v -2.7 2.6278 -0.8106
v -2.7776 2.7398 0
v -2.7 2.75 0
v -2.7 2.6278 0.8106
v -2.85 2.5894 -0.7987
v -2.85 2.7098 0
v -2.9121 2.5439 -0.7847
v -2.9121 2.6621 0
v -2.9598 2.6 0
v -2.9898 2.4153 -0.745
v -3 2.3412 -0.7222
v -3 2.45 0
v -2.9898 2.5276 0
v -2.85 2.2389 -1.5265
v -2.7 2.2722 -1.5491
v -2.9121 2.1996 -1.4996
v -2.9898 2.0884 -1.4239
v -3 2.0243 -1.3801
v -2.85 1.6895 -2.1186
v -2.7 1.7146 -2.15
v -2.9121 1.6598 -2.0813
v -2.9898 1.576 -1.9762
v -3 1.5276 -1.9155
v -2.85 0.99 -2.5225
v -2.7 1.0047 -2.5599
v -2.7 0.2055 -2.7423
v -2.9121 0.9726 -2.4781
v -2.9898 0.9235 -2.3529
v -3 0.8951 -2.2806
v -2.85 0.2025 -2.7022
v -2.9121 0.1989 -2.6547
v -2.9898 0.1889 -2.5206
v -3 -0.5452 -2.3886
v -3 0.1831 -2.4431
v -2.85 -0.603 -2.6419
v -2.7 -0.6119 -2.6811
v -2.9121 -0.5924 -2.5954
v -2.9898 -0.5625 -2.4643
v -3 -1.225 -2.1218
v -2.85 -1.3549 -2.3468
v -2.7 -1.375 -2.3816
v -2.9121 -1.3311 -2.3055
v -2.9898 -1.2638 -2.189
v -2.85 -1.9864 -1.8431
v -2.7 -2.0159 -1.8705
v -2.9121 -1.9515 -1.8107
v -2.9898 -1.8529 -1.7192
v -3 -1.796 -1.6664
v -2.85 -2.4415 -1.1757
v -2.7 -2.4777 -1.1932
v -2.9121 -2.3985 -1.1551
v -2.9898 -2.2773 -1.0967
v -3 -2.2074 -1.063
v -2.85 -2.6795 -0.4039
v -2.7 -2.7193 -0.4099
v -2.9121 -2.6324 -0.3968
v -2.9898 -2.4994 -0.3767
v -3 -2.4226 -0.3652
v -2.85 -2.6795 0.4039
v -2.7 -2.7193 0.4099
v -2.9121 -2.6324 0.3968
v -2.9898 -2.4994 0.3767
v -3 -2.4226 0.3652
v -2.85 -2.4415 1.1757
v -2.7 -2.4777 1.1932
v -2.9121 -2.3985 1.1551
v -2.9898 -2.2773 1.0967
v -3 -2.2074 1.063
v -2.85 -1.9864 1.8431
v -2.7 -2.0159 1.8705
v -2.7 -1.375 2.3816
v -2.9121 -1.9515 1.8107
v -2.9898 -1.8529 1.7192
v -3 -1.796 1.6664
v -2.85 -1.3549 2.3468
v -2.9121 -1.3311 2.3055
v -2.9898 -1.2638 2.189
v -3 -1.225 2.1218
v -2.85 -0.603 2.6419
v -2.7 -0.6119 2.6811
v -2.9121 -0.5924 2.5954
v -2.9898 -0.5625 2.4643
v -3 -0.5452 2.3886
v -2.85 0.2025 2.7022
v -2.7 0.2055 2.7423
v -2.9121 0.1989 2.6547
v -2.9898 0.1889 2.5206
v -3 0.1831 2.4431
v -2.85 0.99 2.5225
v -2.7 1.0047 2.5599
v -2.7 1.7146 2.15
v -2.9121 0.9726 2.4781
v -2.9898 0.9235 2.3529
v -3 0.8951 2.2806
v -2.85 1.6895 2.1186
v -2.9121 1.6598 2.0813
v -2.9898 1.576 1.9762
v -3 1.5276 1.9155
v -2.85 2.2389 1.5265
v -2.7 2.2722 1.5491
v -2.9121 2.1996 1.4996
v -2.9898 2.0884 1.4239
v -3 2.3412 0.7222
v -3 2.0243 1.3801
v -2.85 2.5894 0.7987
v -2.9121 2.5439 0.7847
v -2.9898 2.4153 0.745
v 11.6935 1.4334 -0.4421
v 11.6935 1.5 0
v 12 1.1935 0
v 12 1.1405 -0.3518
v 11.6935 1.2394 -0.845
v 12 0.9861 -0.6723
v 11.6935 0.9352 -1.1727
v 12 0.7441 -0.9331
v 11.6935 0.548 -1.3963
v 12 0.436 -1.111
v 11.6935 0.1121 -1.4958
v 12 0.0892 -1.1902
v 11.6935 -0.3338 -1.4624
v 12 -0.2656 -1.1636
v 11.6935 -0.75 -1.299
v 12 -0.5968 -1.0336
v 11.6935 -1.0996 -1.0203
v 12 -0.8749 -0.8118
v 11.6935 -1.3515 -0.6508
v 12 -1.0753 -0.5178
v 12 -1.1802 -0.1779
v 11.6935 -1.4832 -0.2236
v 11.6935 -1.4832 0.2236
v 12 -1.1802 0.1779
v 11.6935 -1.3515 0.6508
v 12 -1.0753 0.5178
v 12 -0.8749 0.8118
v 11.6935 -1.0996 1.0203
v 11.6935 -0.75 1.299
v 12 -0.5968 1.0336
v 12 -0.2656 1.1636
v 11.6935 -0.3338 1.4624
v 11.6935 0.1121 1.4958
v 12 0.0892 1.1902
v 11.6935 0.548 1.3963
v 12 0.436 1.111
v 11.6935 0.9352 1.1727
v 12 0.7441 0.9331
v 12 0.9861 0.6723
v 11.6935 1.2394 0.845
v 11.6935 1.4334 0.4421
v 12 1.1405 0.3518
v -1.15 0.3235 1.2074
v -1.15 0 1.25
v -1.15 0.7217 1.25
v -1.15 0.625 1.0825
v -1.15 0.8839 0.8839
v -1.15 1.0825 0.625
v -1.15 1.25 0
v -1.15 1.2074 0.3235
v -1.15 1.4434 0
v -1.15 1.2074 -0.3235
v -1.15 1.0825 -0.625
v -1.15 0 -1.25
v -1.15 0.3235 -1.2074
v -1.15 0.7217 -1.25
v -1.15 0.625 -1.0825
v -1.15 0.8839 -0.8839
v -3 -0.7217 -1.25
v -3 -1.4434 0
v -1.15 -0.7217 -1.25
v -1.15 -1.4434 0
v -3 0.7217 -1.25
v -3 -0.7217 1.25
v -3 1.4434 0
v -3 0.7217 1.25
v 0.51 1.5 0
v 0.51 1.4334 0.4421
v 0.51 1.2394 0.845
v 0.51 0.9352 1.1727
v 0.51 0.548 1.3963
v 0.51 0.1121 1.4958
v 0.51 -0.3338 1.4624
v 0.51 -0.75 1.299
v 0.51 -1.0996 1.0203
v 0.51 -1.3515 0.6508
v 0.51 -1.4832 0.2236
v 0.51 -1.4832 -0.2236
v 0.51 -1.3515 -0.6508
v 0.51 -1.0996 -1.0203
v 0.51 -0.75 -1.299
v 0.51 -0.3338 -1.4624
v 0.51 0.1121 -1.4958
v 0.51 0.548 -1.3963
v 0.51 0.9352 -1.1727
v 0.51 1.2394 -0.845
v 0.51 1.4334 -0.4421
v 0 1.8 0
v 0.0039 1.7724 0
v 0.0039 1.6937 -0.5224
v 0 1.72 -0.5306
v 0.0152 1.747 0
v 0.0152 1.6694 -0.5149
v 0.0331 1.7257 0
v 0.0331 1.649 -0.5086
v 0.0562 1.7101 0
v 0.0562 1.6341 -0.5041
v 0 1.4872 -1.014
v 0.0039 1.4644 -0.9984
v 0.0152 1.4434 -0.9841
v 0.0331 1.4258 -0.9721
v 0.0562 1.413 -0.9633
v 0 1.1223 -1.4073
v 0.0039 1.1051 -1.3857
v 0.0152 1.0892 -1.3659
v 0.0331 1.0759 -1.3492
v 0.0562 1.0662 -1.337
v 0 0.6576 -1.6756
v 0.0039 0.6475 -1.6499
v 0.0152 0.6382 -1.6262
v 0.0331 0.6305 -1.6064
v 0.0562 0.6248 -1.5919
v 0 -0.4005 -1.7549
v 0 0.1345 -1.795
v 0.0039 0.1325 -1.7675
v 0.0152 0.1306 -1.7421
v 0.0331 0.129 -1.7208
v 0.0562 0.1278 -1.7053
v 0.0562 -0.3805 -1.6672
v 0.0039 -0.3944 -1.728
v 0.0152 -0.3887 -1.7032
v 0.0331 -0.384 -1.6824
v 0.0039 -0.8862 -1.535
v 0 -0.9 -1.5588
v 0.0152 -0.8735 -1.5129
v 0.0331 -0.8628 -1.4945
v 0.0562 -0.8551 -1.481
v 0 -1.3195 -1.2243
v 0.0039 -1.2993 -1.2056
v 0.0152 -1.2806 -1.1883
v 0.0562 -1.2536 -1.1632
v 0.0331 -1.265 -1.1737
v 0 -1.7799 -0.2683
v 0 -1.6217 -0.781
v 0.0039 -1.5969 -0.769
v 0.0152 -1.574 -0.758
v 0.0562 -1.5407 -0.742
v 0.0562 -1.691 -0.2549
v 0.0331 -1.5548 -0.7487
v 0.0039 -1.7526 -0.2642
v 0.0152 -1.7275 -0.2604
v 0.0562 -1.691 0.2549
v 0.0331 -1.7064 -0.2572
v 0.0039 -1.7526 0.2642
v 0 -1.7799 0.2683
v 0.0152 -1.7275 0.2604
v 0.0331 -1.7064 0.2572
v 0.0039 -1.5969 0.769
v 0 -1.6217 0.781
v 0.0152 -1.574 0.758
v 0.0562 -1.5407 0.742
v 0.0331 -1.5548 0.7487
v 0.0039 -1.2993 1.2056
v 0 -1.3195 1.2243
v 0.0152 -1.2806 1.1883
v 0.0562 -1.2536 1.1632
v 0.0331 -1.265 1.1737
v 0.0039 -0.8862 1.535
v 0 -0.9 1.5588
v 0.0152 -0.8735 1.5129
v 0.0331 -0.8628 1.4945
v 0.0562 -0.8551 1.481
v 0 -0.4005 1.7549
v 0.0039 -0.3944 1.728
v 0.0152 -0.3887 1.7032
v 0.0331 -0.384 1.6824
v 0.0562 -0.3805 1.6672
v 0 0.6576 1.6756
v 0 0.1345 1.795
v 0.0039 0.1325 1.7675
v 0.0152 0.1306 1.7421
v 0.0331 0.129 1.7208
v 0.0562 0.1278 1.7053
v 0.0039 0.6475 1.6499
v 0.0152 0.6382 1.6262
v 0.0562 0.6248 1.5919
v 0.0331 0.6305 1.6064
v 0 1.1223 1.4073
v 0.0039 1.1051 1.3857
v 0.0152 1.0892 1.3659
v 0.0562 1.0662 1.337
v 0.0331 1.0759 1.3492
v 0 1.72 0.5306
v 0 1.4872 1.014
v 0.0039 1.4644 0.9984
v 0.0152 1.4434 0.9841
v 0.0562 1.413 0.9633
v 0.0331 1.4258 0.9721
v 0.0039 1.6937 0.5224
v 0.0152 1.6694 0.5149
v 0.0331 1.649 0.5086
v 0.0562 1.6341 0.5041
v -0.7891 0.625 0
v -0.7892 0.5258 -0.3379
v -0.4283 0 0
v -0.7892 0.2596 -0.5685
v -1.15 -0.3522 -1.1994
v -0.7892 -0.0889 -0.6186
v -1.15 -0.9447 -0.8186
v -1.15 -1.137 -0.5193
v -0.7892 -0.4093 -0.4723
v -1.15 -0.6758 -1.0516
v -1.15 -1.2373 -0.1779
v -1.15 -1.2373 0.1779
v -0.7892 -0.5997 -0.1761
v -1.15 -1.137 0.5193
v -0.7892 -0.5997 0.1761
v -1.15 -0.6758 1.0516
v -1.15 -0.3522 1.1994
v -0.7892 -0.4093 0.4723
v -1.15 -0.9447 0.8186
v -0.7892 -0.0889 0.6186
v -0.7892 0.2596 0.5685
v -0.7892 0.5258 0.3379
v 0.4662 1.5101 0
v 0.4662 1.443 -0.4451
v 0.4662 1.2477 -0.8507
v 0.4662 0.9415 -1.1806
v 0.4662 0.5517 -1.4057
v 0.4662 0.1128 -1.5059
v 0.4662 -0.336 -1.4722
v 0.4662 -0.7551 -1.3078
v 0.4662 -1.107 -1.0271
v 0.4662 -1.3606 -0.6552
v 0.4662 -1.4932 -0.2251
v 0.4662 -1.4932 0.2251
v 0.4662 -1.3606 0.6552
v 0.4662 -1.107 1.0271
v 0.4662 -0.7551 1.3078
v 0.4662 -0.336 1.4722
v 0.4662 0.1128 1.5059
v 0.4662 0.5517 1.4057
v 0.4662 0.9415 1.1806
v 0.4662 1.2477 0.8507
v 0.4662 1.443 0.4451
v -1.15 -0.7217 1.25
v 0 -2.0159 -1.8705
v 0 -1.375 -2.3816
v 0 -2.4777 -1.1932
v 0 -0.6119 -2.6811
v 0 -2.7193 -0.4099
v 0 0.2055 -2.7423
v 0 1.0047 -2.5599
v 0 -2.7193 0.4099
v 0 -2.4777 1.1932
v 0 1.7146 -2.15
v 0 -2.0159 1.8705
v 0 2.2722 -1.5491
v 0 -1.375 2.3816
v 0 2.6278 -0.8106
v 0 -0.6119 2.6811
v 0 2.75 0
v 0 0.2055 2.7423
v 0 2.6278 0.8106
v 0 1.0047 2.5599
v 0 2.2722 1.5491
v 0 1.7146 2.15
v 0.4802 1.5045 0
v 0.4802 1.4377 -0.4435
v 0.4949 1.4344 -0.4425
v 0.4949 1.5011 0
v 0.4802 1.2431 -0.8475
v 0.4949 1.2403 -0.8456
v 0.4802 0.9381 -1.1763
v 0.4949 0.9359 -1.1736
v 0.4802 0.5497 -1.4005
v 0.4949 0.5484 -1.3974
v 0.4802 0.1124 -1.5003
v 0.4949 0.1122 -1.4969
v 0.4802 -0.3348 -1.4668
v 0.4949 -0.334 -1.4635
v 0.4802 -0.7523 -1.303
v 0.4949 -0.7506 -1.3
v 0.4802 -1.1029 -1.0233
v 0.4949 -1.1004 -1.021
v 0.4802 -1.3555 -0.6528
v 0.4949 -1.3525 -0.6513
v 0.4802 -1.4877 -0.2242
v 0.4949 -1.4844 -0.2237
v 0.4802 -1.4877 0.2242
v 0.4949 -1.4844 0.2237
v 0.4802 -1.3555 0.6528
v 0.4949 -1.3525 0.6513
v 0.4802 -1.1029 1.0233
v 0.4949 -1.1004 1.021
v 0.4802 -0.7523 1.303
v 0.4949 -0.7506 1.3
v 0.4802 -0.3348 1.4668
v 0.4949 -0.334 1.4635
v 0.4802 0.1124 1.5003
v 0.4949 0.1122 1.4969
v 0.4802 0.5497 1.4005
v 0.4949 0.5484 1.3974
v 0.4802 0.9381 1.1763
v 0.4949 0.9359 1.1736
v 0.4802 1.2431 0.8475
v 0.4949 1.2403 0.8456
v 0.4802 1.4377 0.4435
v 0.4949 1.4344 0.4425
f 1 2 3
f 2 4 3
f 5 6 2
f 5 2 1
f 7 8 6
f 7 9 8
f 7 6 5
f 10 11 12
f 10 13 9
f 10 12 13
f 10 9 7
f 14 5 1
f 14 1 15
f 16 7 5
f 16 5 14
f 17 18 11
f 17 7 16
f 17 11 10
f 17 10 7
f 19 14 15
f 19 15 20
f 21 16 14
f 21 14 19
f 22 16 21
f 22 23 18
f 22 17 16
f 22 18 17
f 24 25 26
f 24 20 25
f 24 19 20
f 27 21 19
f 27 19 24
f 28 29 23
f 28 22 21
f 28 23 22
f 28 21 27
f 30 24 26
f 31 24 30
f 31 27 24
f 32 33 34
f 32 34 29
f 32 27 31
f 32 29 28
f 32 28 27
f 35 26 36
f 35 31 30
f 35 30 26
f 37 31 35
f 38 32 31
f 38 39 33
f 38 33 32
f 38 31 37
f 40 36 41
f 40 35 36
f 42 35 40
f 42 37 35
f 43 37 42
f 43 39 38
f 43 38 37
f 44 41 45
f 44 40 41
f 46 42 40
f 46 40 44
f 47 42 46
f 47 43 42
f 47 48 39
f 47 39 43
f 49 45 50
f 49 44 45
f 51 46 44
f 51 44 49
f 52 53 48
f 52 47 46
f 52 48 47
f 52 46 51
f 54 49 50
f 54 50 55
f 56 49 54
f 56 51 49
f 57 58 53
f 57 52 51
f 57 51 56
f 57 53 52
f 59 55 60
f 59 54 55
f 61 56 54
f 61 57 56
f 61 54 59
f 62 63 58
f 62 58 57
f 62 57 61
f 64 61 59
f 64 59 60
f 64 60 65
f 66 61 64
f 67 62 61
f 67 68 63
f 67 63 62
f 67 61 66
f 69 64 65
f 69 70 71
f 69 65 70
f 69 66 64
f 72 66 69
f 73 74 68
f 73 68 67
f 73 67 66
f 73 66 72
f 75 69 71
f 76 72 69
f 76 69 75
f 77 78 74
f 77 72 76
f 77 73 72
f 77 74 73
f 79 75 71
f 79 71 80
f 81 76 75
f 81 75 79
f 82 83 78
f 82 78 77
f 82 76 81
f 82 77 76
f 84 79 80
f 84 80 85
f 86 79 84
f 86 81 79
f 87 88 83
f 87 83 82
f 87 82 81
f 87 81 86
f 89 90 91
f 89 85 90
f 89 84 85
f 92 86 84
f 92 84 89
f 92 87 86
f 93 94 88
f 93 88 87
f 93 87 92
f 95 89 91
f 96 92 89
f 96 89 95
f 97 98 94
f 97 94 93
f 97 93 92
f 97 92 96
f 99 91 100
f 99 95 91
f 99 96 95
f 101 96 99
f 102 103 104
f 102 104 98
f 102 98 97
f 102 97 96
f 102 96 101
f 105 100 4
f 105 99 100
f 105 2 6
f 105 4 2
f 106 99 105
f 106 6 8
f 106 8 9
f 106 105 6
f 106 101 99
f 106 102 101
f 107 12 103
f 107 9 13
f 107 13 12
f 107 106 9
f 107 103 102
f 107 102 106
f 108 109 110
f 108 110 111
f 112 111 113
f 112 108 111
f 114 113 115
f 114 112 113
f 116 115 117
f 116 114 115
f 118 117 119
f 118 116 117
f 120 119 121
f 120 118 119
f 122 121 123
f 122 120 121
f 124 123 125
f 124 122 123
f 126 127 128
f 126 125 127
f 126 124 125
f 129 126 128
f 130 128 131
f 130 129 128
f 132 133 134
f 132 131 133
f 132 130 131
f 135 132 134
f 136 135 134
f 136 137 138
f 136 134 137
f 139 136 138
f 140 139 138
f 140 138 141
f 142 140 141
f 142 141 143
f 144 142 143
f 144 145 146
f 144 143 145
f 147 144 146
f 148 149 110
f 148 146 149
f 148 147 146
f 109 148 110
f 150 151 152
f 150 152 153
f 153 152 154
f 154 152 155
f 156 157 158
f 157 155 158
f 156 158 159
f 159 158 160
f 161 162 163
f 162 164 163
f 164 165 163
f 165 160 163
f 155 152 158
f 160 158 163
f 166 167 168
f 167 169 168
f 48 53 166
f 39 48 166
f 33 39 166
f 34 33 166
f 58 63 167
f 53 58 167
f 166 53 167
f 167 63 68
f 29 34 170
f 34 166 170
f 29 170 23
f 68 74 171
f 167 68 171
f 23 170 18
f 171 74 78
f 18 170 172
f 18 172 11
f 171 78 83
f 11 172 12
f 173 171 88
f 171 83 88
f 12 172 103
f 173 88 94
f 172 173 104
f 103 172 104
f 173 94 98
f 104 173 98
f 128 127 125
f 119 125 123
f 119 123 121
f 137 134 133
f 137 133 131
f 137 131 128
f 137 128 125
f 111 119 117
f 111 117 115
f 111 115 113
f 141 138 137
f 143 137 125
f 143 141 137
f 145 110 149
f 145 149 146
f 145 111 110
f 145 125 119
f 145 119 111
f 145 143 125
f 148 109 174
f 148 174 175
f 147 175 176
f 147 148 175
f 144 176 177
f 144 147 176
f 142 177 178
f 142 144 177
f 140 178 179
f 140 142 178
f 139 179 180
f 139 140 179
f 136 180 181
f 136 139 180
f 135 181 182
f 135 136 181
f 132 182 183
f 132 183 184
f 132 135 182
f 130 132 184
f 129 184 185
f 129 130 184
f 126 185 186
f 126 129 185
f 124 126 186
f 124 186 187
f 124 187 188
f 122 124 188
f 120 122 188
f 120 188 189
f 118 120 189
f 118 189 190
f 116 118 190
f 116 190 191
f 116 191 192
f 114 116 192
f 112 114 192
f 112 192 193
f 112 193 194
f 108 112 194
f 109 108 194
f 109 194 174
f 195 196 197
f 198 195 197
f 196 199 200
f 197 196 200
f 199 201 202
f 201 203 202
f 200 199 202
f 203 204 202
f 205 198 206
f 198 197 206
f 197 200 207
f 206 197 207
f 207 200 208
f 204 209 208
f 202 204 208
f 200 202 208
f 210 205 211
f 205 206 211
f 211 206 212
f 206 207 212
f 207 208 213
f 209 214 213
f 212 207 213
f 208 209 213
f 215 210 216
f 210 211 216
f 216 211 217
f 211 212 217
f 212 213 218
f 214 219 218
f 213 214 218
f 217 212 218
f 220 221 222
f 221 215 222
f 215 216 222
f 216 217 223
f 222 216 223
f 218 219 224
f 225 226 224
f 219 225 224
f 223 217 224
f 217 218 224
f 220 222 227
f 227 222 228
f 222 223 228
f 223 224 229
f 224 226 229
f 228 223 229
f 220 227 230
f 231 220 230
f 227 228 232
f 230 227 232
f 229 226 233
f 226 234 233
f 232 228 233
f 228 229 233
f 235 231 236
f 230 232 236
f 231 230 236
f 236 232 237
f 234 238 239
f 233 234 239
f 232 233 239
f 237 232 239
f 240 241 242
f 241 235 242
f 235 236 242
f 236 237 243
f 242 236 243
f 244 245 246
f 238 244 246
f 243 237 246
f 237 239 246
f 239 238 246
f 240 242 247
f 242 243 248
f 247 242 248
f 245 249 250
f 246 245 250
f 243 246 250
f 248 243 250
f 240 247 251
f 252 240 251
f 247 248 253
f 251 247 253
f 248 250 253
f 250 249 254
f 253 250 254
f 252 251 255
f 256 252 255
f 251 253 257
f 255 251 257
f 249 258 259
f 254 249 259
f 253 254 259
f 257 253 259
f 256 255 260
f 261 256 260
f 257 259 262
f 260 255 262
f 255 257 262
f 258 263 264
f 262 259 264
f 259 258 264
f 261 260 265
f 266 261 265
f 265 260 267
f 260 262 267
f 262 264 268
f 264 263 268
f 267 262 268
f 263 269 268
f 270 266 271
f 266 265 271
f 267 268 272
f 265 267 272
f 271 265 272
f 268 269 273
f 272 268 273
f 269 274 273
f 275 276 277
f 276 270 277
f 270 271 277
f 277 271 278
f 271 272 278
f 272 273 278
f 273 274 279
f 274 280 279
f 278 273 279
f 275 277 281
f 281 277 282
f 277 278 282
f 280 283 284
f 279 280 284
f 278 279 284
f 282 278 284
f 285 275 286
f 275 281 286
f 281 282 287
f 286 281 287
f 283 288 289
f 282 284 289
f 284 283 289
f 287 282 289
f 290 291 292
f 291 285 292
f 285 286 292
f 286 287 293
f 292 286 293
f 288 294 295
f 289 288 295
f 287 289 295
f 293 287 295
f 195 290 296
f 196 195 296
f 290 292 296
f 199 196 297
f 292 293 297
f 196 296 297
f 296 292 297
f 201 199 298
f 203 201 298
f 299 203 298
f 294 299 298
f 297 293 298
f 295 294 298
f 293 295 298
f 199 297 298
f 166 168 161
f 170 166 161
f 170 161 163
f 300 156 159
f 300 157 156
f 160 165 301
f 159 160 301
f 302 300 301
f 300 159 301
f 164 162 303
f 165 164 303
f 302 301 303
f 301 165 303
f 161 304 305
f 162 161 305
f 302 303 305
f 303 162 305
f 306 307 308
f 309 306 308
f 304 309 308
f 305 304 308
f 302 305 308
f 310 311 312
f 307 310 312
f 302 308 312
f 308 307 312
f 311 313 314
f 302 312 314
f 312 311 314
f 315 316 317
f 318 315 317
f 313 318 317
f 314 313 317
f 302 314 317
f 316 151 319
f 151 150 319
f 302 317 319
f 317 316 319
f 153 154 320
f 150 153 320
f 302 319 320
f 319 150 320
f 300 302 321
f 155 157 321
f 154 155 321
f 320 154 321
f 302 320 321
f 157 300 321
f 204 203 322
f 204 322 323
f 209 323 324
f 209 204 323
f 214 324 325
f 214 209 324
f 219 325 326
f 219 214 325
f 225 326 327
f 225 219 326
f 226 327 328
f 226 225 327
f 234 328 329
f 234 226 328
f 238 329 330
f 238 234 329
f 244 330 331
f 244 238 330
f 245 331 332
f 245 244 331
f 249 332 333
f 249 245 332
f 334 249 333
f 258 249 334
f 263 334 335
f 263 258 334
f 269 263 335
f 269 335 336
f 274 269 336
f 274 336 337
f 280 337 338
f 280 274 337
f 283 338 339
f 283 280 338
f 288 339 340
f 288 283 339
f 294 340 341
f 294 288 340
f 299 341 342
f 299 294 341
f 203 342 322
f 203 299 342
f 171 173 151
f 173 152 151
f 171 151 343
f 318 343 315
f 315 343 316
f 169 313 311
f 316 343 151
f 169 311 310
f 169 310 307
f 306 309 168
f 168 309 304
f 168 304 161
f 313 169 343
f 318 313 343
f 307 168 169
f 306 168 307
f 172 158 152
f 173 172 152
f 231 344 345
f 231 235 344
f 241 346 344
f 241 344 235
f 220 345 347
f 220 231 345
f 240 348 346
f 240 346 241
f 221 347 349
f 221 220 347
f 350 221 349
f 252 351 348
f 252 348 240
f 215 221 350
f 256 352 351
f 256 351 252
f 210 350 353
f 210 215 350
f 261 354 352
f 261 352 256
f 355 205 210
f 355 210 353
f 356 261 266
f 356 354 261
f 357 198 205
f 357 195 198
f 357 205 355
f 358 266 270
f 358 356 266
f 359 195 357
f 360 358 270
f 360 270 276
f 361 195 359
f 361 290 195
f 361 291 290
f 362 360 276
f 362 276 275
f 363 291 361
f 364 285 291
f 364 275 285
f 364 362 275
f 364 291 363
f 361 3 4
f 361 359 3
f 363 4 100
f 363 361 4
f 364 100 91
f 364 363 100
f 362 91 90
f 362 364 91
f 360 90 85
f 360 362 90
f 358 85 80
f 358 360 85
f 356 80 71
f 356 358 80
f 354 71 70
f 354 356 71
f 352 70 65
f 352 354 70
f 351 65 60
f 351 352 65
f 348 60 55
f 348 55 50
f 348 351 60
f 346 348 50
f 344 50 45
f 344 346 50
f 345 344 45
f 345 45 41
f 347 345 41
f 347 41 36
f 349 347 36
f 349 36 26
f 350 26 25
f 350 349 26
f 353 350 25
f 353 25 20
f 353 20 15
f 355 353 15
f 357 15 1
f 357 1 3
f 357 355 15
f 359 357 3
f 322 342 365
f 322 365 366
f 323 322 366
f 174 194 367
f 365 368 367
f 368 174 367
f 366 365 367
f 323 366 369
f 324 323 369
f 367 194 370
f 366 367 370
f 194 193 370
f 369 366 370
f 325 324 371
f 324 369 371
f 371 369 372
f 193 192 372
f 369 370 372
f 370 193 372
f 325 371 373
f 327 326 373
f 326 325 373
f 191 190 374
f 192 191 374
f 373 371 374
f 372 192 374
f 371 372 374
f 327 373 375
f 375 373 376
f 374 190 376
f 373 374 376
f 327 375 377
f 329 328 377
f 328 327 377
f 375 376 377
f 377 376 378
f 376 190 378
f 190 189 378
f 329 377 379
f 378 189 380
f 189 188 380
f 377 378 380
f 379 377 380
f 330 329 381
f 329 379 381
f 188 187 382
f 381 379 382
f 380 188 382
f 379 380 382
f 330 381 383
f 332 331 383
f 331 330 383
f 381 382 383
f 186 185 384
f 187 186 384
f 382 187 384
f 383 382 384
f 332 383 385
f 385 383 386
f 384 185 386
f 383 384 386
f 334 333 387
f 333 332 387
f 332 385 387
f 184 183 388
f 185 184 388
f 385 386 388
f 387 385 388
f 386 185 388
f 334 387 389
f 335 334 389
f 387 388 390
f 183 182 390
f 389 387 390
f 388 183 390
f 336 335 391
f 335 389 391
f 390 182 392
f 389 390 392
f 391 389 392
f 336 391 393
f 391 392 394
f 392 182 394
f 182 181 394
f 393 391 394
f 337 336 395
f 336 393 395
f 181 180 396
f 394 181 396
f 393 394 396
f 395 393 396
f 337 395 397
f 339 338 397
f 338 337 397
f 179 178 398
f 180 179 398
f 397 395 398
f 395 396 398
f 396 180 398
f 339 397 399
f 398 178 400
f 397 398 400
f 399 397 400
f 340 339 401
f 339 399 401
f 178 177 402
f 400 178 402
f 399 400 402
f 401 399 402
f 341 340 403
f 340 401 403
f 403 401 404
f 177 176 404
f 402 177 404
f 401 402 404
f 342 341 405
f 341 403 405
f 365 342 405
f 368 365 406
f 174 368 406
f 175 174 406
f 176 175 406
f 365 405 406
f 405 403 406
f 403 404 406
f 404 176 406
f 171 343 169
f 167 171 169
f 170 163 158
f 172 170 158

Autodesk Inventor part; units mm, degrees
sketch "Skizze_2" plane through (0, 0, 0) normal (0, 0, 1) x (1, 0, 0)
  line L0 (12, 0) -> (-0.4283, 0)
  line L1 (-0.4283, 0) -> (-1.15, 1.25)
  line L2 (-1.15, 1.25) -> (-3, 1.25)
  line L3 (-3, 1.25) -> (-3, 2.45)
  arc A0 (-2.7, 2.75) -> (-3, 2.45) centre (-2.7, 2.45) ccw
  line L4 (-2.7, 2.75) -> (0, 2.75)
  line L5 (0, 2.75) -> (0, 1.8)
  arc A1 (0, 1.8) -> (0.0562, 1.7101) centre (0.1, 1.8) ccw
  line L6 (0.0562, 1.7101) -> (0.4662, 1.5101)
  arc A2 (0.4662, 1.5101) -> (0.51, 1.5) centre (0.51, 1.6) ccw
  line L7 (0.51, 1.5) -> (11.6935, 1.5)
  line L8 (11.6935, 1.5) -> (12, 1.1935)
  line L9 (12, 1.1935) -> (12, 0)
  line L10 (12, 0) -> (-0.4283, 0)
revolve "Revolution1" add sketch "Skizze_2" angle 360 about axis through (12, 0, 0) along (1, 0, 0)
thread "Thread1" size "M3x0.5" class "6g" standard "ISO Metric profile" length 1.1935
sketch "Skizze_1" plane through (-1.15, 0, 0) normal (1, 0, 0) x (0, 0, -1)
  line L0 (-1.25, -0.7217) -> (0, -1.4434)
  line L1 (0, -1.4434) -> (1.25, -0.7217)
  line L2 (1.25, -0.7217) -> (1.25, 0.7217)
  line L3 (1.25, 0.7217) -> (0, 1.4434)
  line L4 (0, 1.4434) -> (-1.25, 0.7217)
  line L5 (-1.25, 0.7217) -> (-1.25, -0.7217)
extrude "Extrusion1" cut sketch "Skizze_1" against normal blind 2.6
ref_plane "IP1_XY" through (0, 0, 0) normal (1, 0, 0) x (0, 0, -1)
ref_plane "IP1_YZ" through (0, 0, 0) normal (0, 0, -1) x (0, 1, 0)
ref_plane "IP1_ZX" through (0, 0, 0) normal (0, 1, 0) x (1, 0, 0)
ref_plane "IP2_XY" through (-3, 0, 0) normal (1, 0, 0) x (0, 0, -1)
ref_plane "IP2_YZ" through (-3, 0, 0) normal (0, 0, -1) x (0, 1, 0)
ref_plane "IP2_ZX" through (-3, 0, 0) normal (0, 1, 0) x (1, 0, 0)
ref_plane "IP3_XY" through (12, 0, 0) normal (1, 0, 0) x (0, 0, -1)
ref_plane "IP3_YZ" through (12, 0, 0) normal (0, 0, -1) x (0, 1, 0)
ref_plane "IP3_ZX" through (12, 0, 0) normal (0, 1, 0) x (1, 0, 0)
ref_plane "IP4_XY" through (0, 0, 0) normal (1, 0, 0) x (0, 0, -1)
ref_plane "IP4_YZ" through (0, 0, 0) normal (0, 0, -1) x (0, 1, 0)
ref_plane "IP4_ZX" through (0, 0, 0) normal (0, 1, 0) x (1, 0, 0)
properties part number "Slotted head cap screw ISO 4762 - M3x12"
